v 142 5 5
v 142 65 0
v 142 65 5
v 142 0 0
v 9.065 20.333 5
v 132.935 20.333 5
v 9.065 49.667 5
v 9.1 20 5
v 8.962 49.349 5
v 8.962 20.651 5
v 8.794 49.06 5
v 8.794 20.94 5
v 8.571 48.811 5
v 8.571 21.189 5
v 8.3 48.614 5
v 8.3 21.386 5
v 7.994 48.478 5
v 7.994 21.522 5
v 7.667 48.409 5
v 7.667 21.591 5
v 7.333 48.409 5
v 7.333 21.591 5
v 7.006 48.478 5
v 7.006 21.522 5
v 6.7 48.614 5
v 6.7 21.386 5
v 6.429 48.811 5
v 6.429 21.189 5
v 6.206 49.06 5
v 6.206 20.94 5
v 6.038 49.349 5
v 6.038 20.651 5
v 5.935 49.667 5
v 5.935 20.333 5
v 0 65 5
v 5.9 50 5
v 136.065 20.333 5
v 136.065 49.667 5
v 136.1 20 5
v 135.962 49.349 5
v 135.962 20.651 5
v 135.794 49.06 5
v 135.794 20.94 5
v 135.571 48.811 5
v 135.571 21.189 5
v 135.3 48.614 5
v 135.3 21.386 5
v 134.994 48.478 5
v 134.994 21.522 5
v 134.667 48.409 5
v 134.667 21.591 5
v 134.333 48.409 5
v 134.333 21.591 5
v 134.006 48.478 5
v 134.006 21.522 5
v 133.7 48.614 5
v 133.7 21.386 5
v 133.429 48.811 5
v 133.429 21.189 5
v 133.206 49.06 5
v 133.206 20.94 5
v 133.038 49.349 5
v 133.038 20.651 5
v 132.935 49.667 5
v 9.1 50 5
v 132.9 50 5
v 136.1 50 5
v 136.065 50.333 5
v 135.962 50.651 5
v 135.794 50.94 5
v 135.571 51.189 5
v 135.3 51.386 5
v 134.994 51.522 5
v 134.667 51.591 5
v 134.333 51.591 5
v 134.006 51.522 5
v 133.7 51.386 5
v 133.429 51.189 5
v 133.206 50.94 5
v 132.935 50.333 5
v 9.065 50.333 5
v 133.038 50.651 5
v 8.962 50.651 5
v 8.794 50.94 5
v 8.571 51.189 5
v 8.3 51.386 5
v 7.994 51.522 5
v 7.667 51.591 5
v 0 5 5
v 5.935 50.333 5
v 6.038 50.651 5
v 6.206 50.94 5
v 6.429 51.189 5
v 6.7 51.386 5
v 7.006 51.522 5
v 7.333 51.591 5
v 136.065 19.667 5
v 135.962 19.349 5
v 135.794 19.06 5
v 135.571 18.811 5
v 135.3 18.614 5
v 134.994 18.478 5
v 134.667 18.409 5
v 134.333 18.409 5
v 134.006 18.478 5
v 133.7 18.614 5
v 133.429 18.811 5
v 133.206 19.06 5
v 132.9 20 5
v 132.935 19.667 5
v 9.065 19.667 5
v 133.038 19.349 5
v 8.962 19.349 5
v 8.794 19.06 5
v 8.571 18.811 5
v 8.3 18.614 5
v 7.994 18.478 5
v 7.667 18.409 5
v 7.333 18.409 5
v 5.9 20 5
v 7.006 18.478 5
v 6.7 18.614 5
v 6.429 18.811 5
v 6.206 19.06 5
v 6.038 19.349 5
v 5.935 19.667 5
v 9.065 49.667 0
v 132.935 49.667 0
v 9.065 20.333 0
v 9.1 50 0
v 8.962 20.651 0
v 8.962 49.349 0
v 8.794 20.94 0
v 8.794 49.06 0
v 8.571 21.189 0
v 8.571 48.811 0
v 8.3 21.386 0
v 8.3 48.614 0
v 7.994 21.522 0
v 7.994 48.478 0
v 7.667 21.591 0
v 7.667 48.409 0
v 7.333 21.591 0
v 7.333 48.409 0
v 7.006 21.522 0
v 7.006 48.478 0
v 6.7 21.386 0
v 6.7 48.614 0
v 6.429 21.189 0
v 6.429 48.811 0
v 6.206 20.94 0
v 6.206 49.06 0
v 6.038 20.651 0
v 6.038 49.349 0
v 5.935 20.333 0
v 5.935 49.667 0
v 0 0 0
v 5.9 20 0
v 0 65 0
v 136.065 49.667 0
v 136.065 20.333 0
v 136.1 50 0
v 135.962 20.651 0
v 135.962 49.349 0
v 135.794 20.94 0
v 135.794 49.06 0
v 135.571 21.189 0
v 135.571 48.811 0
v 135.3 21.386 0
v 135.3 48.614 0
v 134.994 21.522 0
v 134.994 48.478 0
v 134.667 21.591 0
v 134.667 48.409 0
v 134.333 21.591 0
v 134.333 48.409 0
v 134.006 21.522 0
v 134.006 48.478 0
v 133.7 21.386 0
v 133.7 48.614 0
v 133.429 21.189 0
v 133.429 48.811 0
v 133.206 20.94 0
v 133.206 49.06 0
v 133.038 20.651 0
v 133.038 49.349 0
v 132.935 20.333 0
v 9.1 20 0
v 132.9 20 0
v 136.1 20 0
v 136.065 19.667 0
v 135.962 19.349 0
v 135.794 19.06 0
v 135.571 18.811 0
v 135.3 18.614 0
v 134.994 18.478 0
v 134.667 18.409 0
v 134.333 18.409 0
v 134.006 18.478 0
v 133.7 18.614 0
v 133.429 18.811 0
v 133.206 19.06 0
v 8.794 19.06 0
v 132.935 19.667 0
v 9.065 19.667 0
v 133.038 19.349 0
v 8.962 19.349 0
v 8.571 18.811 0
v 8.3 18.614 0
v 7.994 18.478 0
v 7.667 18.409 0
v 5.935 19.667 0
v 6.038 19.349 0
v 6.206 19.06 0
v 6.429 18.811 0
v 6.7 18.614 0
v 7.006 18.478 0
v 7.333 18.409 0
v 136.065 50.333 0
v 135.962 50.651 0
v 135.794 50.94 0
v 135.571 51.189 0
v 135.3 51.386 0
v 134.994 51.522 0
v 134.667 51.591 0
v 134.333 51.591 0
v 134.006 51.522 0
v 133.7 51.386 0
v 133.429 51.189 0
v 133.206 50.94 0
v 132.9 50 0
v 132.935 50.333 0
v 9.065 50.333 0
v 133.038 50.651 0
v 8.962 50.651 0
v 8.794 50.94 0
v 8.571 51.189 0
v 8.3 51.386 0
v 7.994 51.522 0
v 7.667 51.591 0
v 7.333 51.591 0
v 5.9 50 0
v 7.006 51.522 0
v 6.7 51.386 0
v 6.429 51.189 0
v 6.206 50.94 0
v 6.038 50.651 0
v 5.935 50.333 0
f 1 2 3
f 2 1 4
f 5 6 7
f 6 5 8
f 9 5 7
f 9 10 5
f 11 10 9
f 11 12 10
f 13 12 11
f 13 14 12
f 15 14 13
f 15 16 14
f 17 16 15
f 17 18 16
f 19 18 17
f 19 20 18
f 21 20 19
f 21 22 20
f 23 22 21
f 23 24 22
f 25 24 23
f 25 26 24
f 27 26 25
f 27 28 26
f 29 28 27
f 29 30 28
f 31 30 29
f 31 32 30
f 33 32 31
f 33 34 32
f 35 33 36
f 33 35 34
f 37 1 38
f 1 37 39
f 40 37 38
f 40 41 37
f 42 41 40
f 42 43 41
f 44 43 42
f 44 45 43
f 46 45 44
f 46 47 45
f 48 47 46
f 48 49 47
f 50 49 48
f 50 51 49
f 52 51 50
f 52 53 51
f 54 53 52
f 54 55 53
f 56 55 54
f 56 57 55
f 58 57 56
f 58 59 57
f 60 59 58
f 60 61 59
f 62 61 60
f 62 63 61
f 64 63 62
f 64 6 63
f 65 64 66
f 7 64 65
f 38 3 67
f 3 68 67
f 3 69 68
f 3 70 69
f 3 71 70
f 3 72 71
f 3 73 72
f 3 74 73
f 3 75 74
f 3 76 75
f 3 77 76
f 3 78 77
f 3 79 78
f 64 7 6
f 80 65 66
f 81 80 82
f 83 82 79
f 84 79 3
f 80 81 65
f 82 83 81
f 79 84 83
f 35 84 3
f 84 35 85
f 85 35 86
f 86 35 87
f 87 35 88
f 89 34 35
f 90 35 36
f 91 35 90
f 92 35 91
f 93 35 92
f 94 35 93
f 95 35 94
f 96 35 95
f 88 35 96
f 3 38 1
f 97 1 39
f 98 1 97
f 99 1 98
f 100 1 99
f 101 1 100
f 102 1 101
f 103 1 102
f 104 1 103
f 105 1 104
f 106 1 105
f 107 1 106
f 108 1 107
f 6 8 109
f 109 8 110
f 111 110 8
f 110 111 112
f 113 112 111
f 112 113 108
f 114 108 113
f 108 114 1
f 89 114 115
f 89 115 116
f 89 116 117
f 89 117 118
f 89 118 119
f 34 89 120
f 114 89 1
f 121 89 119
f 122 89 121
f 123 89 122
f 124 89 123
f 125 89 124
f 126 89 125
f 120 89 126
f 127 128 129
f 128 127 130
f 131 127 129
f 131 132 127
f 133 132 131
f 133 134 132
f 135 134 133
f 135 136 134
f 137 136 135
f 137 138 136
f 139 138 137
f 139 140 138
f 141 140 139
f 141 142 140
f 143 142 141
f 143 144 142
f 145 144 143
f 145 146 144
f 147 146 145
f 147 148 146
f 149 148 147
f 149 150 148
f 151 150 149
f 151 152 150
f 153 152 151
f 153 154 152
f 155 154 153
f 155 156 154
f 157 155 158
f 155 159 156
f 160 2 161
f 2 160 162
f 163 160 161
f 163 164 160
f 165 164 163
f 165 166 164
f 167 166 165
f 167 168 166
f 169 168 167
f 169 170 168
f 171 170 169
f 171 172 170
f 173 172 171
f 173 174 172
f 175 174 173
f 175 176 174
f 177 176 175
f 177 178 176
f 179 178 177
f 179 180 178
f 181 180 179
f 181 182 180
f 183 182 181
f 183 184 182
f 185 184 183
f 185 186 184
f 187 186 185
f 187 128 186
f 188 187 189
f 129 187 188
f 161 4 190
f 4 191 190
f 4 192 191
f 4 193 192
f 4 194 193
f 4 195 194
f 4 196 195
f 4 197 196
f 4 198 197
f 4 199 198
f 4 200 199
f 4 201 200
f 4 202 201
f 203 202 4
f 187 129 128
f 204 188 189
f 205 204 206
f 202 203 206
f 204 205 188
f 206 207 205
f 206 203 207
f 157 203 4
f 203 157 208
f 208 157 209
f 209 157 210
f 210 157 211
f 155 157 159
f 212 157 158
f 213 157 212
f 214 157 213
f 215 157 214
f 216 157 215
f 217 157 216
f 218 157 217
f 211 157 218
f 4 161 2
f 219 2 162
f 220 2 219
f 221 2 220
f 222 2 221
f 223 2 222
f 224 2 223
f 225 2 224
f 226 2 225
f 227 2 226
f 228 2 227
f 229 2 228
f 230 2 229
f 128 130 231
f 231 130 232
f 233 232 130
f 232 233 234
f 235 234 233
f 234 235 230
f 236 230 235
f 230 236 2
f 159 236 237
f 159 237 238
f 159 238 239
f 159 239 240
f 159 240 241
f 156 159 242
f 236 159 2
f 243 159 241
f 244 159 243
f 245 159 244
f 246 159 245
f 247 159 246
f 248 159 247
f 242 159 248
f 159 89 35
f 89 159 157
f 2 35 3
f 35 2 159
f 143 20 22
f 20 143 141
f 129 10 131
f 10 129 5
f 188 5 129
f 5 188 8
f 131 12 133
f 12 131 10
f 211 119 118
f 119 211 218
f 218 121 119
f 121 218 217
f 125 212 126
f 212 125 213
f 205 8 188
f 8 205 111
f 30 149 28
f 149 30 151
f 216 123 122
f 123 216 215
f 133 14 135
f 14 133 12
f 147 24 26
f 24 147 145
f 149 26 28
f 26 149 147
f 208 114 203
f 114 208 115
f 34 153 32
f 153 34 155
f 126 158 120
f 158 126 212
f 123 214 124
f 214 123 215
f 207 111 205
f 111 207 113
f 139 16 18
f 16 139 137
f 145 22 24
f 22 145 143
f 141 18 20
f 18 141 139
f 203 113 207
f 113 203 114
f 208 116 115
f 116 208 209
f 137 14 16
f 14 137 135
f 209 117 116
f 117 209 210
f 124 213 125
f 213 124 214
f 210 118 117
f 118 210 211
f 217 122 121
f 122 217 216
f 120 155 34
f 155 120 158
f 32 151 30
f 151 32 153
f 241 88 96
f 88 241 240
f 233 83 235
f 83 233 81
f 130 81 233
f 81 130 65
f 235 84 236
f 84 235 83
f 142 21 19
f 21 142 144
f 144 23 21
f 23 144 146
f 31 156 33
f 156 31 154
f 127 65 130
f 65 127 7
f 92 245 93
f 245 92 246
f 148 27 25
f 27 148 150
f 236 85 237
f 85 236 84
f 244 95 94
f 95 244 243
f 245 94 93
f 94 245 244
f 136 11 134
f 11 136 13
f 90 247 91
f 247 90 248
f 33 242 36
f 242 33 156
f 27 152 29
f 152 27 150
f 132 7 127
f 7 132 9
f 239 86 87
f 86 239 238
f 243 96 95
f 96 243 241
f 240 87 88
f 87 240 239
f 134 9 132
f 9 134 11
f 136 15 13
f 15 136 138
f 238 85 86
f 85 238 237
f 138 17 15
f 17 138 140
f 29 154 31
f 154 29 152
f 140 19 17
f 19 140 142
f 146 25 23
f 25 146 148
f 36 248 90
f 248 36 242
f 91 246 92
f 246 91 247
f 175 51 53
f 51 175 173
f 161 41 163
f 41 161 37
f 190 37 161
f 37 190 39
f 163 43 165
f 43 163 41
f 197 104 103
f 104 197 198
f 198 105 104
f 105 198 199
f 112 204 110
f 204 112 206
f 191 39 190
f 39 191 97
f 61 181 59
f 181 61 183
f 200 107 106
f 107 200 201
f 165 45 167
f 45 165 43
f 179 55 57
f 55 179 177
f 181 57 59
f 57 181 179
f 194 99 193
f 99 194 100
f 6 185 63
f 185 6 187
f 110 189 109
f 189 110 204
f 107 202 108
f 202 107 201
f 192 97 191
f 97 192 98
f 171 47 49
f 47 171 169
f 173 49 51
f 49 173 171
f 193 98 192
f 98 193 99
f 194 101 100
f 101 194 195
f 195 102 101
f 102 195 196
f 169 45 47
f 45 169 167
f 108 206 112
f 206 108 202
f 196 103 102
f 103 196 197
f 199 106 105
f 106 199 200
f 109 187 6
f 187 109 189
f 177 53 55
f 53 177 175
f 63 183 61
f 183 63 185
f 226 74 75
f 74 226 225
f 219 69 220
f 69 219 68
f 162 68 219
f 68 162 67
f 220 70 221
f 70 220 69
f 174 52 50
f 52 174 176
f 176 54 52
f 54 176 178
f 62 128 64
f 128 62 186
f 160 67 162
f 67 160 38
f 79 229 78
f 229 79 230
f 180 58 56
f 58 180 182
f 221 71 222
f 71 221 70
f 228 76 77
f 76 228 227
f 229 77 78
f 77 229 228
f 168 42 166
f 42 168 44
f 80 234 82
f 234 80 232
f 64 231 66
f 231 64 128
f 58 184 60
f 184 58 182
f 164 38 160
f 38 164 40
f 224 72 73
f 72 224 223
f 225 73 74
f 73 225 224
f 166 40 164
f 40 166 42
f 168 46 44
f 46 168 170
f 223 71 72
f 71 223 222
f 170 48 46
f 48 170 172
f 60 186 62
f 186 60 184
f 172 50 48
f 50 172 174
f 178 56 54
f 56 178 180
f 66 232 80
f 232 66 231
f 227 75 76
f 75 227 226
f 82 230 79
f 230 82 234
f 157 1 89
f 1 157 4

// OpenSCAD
$fn=30;

difference(){
translate([0,0,0])cube([142,65,5]);
    
translate([7.5,20,0])cylinder(d=3.2,h=12);
translate([7.5,50,0])cylinder(d=3.2,h=12);
translate([142-7.5,20,0])cylinder(d=3.2,h=12);
translate([142-7.5,50,0])cylinder(d=3.2,h=12);
translate([-30,0,0])cylinder(d=10,h=142,$fn=4);
translate([0,0,5])rotate([0,90,0])
    cylinder(d=10,h=142,$fn=4);
}
